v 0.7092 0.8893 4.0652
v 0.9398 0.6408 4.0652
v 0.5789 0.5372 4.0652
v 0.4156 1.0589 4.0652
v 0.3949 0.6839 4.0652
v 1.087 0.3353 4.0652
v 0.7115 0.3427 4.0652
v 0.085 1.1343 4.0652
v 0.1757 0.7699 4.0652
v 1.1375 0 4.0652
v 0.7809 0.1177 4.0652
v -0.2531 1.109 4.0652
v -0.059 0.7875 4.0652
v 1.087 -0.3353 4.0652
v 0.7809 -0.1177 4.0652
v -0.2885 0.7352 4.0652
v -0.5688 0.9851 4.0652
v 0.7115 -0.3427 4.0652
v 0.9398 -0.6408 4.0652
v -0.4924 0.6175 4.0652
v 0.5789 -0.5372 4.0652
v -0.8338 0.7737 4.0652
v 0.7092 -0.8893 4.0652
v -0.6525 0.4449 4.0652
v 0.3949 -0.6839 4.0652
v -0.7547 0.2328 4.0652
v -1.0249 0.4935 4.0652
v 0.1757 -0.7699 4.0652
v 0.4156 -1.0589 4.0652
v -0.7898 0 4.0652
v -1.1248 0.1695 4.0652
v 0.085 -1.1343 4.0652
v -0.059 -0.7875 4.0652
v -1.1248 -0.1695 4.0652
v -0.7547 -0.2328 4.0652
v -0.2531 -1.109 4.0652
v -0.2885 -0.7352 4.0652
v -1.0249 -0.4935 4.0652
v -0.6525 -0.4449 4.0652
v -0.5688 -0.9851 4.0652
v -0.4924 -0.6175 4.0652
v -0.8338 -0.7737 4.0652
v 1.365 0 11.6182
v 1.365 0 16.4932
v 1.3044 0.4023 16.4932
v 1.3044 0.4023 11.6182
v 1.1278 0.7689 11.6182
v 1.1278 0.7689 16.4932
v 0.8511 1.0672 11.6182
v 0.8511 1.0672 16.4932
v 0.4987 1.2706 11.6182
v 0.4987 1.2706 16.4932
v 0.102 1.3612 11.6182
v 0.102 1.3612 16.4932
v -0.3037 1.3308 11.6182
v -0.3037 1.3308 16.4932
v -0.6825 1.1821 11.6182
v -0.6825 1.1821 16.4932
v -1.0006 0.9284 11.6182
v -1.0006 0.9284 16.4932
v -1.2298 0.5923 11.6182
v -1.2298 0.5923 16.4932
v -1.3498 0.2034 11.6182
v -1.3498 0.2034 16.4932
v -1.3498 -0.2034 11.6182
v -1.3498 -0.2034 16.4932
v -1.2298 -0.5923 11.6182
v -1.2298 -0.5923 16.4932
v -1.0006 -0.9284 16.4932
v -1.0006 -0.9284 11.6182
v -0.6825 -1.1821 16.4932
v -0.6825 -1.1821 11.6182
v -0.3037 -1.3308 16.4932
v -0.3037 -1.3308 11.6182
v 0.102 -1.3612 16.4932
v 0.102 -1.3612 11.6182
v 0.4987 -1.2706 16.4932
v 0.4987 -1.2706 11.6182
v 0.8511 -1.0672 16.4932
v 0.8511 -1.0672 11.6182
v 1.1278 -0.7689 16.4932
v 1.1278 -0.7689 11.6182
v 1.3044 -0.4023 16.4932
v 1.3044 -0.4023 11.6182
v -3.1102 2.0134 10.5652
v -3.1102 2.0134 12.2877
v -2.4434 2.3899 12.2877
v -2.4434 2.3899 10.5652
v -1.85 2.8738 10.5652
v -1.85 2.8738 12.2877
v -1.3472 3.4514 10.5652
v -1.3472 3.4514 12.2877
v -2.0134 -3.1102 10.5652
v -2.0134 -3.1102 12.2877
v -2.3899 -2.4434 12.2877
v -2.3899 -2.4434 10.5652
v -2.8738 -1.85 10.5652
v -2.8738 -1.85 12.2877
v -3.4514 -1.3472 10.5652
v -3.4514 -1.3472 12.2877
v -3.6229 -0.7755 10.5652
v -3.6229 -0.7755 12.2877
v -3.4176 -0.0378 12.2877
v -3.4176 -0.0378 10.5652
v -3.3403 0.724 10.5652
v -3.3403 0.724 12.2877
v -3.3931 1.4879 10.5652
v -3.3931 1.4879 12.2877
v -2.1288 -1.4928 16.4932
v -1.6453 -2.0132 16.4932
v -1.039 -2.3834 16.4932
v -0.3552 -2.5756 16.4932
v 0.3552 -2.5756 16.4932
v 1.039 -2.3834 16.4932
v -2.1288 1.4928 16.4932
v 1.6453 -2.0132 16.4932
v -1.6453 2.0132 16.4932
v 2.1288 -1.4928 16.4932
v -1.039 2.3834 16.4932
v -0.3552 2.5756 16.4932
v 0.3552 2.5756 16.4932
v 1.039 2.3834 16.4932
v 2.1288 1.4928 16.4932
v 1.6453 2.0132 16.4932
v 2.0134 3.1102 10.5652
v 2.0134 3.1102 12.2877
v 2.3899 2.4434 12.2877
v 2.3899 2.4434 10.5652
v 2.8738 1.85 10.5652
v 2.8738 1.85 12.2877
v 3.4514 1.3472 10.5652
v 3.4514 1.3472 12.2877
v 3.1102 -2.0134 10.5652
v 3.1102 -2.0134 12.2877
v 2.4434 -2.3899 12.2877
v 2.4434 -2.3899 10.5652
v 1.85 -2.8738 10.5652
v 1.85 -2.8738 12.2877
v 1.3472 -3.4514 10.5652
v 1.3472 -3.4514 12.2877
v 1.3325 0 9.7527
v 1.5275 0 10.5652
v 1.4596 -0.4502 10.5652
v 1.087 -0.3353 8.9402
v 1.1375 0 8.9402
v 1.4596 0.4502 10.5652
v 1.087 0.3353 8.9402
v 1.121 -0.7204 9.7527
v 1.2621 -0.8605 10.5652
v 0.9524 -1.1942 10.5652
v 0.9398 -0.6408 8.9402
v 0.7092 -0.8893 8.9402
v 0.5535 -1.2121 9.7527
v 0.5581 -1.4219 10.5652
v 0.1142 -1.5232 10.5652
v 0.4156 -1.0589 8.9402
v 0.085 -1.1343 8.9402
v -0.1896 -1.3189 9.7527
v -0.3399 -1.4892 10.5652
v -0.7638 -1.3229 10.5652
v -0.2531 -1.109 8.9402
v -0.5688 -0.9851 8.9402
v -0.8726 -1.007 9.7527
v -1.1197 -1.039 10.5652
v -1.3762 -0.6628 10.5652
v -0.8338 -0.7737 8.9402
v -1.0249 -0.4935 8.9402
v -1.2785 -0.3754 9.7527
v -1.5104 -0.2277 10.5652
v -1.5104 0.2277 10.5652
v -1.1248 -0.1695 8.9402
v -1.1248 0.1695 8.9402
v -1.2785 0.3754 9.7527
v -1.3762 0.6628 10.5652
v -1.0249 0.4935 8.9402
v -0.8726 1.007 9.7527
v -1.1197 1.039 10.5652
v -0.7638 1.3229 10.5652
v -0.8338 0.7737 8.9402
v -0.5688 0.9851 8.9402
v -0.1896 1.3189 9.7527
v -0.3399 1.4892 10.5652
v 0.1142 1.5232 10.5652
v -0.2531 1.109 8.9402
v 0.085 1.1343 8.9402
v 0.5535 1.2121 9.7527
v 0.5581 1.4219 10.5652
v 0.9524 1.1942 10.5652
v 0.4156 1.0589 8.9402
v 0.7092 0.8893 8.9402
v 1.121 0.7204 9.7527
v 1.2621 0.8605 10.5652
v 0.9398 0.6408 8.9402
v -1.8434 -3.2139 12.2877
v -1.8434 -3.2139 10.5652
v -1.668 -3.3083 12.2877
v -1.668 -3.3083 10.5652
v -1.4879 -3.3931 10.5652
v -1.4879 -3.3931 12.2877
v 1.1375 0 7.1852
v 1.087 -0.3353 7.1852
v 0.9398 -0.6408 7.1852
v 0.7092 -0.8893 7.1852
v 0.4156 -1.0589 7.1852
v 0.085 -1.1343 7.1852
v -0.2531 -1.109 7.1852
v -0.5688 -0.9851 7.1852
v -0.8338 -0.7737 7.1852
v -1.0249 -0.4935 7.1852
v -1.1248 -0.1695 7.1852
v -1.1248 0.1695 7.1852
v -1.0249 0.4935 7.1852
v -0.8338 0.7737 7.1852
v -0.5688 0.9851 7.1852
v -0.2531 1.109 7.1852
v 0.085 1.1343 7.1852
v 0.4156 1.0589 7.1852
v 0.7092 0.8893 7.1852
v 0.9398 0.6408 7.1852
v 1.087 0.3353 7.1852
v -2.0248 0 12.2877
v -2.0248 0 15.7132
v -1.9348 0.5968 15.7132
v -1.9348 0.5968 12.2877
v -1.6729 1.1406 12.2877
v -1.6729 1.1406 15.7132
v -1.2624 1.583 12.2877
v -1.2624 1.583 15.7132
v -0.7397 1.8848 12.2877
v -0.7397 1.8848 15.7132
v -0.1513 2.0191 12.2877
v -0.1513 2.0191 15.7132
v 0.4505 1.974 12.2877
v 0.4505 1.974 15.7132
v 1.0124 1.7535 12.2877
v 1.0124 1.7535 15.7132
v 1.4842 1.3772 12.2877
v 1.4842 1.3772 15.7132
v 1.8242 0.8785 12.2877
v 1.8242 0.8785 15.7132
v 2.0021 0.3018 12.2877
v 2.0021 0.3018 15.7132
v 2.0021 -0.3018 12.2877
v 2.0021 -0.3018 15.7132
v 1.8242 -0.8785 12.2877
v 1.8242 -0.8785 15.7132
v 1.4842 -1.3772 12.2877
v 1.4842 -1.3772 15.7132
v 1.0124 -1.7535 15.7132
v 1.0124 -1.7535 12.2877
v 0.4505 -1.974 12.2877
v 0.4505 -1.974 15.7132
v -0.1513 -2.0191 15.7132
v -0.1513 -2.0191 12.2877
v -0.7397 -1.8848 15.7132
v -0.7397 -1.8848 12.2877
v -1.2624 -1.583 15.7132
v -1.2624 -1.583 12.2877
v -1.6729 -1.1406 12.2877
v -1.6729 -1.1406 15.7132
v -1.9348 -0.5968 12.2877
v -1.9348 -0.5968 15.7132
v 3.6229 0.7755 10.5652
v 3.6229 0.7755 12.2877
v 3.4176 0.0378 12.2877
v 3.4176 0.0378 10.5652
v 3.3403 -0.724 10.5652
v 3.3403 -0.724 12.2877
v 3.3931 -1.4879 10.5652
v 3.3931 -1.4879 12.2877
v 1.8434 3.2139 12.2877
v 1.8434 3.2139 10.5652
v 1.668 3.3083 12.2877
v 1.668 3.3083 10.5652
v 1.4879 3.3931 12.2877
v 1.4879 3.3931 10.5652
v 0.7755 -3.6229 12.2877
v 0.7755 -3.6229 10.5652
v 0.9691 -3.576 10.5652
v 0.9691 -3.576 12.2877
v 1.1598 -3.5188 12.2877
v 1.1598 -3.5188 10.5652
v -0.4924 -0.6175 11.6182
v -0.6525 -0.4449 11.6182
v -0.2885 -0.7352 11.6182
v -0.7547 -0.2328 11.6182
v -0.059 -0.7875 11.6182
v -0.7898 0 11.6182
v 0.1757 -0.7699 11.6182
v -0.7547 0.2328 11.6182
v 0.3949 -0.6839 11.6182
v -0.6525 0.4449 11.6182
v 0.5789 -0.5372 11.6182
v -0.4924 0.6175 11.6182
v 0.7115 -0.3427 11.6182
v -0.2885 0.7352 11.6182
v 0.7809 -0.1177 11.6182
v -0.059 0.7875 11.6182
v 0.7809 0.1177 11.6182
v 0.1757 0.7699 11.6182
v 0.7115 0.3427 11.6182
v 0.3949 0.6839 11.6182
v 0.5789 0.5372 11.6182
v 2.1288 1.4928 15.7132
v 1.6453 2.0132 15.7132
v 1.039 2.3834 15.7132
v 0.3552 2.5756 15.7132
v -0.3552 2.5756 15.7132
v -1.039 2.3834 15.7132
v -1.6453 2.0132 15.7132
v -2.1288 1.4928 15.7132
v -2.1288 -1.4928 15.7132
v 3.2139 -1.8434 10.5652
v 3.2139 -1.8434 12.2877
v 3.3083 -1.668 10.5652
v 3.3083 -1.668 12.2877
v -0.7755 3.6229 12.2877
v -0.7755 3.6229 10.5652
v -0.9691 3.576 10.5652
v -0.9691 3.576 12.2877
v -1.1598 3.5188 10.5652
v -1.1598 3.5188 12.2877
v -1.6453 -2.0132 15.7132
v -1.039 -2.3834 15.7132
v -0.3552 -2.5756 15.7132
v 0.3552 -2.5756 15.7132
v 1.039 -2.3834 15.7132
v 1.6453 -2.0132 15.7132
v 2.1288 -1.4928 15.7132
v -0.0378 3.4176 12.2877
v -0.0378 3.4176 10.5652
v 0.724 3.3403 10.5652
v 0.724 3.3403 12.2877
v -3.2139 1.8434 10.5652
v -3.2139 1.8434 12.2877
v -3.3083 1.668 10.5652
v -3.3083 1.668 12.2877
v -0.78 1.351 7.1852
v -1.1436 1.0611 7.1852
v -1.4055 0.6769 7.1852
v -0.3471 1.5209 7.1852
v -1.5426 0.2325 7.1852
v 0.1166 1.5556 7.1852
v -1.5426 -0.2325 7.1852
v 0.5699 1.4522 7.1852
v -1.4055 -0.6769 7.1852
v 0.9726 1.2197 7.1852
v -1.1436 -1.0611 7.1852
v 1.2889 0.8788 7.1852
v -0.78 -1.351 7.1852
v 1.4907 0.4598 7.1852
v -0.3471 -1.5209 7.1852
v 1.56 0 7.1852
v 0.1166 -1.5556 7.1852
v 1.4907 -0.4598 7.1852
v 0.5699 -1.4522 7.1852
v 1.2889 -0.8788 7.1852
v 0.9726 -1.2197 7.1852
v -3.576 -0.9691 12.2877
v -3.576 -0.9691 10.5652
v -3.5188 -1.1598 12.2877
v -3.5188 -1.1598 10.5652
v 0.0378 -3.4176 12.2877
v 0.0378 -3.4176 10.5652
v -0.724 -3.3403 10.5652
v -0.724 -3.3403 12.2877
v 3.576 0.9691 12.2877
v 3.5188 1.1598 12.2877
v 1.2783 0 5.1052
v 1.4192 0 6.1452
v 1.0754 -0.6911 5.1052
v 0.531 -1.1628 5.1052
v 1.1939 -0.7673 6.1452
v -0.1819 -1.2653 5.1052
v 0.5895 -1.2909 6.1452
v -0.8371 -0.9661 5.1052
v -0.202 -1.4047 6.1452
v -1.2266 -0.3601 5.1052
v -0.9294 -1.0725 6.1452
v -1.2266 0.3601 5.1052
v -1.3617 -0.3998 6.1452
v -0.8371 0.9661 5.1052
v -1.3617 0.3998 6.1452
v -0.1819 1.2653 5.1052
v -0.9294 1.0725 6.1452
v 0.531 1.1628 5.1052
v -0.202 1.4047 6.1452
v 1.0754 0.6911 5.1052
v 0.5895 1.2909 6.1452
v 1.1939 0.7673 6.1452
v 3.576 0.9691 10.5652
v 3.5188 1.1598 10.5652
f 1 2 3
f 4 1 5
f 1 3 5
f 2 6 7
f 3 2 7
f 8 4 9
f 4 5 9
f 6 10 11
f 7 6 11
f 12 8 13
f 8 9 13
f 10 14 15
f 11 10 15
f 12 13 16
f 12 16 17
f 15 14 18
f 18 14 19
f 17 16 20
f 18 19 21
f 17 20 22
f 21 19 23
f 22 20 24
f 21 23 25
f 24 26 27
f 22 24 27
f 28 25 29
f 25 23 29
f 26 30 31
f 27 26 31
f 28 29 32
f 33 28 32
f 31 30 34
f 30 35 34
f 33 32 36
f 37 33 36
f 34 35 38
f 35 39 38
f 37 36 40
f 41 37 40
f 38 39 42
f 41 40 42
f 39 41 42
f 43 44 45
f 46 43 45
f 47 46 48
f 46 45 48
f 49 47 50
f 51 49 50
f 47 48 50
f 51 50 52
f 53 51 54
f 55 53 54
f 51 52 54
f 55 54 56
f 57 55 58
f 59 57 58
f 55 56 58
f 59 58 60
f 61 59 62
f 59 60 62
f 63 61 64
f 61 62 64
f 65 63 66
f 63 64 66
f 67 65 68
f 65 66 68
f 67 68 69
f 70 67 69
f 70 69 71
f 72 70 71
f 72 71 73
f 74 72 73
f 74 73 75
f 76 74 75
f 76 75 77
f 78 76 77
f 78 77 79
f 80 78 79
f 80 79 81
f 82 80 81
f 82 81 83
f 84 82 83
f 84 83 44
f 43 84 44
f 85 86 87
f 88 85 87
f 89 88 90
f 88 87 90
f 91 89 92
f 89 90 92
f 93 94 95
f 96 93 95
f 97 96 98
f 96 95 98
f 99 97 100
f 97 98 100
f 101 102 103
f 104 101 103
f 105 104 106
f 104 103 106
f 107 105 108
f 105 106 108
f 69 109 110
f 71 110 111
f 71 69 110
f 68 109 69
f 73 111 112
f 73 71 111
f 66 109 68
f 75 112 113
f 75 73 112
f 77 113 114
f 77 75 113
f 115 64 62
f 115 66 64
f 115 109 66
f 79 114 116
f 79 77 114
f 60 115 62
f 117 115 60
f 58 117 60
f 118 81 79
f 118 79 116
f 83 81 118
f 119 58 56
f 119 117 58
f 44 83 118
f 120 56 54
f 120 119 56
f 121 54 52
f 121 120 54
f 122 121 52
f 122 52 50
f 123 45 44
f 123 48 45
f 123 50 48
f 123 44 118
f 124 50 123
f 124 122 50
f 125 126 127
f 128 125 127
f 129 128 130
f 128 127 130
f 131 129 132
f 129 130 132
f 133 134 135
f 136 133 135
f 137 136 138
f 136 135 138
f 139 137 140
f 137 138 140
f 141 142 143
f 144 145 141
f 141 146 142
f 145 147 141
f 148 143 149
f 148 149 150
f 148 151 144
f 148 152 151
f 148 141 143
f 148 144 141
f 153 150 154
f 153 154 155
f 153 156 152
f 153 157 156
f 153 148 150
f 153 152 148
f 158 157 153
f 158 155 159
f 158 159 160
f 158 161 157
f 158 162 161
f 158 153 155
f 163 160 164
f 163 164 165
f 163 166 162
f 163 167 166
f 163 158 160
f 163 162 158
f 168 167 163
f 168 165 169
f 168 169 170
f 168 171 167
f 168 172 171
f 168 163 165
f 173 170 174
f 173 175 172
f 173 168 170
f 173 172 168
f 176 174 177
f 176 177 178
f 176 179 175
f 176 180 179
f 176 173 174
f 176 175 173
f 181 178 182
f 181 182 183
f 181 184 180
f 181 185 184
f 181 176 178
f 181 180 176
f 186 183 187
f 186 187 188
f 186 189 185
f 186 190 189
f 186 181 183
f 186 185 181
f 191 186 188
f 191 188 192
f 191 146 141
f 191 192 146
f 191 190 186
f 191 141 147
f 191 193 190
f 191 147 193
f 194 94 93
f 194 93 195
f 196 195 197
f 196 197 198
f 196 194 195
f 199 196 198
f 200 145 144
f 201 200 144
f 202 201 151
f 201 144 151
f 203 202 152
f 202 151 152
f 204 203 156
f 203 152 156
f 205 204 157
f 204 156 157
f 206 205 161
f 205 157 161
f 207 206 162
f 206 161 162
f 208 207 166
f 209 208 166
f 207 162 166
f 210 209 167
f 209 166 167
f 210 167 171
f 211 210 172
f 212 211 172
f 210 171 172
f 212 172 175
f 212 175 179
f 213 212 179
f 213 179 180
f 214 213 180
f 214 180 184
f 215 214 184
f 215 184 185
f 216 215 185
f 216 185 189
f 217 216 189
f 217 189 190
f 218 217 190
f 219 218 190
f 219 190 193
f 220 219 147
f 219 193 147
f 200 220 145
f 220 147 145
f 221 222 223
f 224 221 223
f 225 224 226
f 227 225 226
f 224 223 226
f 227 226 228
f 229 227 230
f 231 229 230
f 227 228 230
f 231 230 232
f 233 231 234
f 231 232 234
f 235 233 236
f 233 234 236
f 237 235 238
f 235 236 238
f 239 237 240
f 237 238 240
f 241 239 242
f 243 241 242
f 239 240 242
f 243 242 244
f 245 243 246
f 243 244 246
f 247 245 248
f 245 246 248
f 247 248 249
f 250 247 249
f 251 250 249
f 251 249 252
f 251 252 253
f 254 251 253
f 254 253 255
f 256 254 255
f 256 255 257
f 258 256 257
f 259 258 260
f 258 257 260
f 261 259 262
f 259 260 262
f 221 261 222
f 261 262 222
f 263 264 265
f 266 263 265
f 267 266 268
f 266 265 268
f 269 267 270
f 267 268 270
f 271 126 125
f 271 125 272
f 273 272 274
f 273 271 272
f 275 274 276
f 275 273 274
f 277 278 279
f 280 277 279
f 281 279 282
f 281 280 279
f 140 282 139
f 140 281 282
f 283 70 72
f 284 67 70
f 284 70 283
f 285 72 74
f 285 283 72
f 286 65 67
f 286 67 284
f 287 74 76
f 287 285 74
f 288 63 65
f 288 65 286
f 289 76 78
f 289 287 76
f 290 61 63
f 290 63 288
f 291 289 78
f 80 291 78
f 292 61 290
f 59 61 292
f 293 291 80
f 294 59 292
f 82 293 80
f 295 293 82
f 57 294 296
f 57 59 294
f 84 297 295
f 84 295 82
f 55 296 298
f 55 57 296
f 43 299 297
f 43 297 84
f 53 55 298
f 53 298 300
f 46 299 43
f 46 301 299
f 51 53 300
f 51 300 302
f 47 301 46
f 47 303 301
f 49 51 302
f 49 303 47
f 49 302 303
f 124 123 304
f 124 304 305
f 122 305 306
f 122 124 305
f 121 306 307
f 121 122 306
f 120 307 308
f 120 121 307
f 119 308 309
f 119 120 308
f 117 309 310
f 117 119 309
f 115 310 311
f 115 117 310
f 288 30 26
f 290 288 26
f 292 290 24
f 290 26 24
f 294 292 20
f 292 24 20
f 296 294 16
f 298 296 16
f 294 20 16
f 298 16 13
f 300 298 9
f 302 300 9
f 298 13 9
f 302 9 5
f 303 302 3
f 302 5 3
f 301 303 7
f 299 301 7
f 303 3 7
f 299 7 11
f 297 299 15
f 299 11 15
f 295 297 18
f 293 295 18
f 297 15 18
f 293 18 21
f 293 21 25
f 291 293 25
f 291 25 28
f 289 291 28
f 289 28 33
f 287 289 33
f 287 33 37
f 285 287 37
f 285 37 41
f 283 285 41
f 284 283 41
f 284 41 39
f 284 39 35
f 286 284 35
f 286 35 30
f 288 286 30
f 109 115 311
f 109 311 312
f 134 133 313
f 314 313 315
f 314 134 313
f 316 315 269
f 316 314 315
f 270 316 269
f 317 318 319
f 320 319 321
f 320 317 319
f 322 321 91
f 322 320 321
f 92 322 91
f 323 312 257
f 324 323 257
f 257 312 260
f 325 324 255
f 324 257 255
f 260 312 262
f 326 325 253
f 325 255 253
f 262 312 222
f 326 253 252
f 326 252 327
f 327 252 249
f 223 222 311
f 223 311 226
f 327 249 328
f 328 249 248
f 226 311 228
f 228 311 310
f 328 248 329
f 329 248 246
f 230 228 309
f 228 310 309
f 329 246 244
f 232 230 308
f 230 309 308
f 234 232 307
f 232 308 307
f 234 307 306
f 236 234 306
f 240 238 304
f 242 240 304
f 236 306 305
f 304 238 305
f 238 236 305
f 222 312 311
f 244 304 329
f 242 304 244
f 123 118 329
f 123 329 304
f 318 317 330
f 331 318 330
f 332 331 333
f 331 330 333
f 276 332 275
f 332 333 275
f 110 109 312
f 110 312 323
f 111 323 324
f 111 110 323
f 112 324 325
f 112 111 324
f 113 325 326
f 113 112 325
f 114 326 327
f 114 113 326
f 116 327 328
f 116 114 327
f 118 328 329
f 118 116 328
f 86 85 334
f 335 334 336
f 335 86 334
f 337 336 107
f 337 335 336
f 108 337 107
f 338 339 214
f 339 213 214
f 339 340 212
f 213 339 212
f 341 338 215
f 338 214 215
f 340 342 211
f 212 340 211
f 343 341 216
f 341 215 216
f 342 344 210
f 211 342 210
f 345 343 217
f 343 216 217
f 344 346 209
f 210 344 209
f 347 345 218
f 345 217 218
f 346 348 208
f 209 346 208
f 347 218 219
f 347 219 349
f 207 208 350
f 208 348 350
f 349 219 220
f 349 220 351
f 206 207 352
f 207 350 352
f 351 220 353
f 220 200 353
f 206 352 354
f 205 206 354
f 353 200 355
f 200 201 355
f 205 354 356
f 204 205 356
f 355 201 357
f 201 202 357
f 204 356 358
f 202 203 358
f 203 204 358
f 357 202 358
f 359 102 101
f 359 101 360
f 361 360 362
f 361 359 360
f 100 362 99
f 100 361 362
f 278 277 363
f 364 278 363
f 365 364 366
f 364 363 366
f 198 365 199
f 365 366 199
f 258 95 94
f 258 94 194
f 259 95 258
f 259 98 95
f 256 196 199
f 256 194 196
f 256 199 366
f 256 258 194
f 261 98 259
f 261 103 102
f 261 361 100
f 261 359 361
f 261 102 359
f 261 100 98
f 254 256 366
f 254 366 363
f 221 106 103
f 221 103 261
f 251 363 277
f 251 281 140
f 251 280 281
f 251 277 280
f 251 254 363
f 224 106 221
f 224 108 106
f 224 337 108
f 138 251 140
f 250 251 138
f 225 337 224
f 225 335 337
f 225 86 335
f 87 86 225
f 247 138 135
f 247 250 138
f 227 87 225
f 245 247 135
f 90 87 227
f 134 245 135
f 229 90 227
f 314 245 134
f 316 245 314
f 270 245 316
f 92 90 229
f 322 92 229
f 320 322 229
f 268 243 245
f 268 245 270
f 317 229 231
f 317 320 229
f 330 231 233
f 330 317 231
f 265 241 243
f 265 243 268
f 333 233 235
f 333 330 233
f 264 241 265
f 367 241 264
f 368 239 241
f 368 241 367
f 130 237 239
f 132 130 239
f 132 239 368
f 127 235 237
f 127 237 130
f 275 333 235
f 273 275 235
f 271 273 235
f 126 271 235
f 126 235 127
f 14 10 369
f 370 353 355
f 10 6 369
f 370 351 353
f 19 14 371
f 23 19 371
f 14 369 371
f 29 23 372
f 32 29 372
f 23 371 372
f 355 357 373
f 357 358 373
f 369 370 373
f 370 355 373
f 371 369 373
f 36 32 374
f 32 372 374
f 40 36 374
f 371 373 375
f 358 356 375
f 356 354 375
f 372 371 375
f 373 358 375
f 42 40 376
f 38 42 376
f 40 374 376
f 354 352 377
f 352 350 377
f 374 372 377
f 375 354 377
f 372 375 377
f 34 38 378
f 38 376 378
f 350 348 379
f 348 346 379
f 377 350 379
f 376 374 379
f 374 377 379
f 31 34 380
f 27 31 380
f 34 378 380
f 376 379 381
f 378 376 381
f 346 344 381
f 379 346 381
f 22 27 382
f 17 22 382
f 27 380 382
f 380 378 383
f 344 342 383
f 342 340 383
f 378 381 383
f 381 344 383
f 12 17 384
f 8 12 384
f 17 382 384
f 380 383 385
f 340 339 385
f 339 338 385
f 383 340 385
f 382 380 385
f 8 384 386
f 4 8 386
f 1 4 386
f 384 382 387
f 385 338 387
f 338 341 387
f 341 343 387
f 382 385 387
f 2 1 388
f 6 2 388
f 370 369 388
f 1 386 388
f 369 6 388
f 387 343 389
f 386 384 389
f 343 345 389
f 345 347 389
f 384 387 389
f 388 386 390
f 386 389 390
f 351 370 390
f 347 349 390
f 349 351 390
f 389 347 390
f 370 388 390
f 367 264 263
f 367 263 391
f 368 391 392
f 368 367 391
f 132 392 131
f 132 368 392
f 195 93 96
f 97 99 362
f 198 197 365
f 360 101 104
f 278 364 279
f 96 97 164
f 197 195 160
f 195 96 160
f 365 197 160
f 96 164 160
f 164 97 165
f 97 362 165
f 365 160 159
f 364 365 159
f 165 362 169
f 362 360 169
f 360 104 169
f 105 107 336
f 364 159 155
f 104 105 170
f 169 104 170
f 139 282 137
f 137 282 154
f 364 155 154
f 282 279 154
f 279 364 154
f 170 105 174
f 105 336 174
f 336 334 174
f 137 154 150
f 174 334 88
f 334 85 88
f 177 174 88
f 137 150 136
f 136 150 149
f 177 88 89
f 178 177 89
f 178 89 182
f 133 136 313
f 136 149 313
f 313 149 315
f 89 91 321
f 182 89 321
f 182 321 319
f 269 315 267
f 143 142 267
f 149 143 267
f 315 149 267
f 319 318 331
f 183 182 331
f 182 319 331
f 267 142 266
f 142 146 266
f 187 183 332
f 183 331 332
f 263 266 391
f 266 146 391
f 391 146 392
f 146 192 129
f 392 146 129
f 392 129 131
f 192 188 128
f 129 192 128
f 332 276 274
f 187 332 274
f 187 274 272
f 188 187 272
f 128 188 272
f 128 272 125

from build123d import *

# Parameters (mm, degrees)
BOSS_EXTRUDE1_DEPTH                                 = 1.2
SKETCH2_R                                           = 3.115
BOSS_EXTRUDE2_DEPTH                                 = 5.27
SKETCH3_R                                           = 5.7
BOSS_EXTRUDE3_DEPTH                                 = 2.65
CUT_EXTRUDE1_DEPTH                                  = 3.65
CUT_EXTRUDE2_DEPTH                                  = 3.65
CUT_EXTRUDE3_DEPTH                                  = 3.65
CUT_EXTRUDE4_DEPTH                                  = 3.65
CUT_EXTRUDE5_DEPTH                                  = 3.65
CUT_EXTRUDE6_DEPTH                                  = 3.65
CUT_EXTRUDE7_DEPTH                                  = 3.65
CUT_EXTRUDE8_DEPTH                                  = 3.65
CBORE_FOR_2_BINDING_HEAD_MACHINE_SCREW1_D           = 2.43
CBORE_FOR_2_BINDING_HEAD_MACHINE_SCREW1_DEPTH       = 19.12
CBORE_FOR_2_BINDING_HEAD_MACHINE_SCREW1_CBORE_D     = 4.2
CBORE_FOR_2_BINDING_HEAD_MACHINE_SCREW1_CBORE_DEPTH = 7.5
CHAMFER1_SIZE                                       = 0.6
CHAMFER1_SIZE2                                      = 2.5
SCALE1_SCALE                                        = 0.65


with BuildPart() as part:
    # Sketch1 → Boss-Extrude1 (new body)
    with BuildSketch(Plane.XY.offset(19.12)):
        with BuildLine():
            Line((-3.275, 2.296600749), (-3.275, -2.296600749))
            ThreePointArc((-3.275, -2.296600749), (0, -4), (3.275, -2.296600749))
            Line((3.275, -2.296600749), (3.275, 2.296600749))
            ThreePointArc((3.275, 2.296600749), (0, 4), (-3.275, 2.296600749))
        make_face()
    extrude(amount=-BOSS_EXTRUDE1_DEPTH)

    # Sketch2 → Boss-Extrude2 (add)
    with BuildSketch(Plane(origin=(0, 0, 17.92), x_dir=(-1, 0, 0), z_dir=(0, 0, -1))):
        Circle(SKETCH2_R)
    extrude(amount=BOSS_EXTRUDE2_DEPTH)

    # Sketch3 → Boss-Extrude3 (add)
    with BuildSketch(Plane.XY.offset(12.65)):
        Circle(SKETCH3_R)
    extrude(amount=-BOSS_EXTRUDE3_DEPTH)

    # Sketch4 → Cut-Extrude1 (cut, through all)
    with BuildSketch(Plane.XY.offset(12.65)):
        with BuildLine():
            ThreePointArc((-5.220198487, 2.289001477), (-5.670846635, 0.575759012), (-5.573734722, -1.193097334))
            ThreePointArc((-5.573734722, -1.193097334), (-5.173403948, 0.525253836), (-5.220198487, 2.289001477))
        make_face()
    extrude(amount=-CUT_EXTRUDE1_DEPTH, mode=Mode.SUBTRACT)

    # Sketch5 → Cut-Extrude2 (cut, through all)
    with BuildSketch(Plane.XY.offset(12.65)):
        with BuildLine():
            ThreePointArc((-2.072669282, 5.309806215), (-3.602771009, 4.417017213), (-4.784872834, 3.097578403))
            ThreePointArc((-4.784872834, 3.097578403), (-3.286738464, 4.029559562), (-2.072669282, 5.309806215))
        make_face()
    extrude(amount=-CUT_EXTRUDE2_DEPTH, mode=Mode.SUBTRACT)

    # Sketch6 → Cut-Extrude3 (cut, through all)
    with BuildSketch(Plane.XY.offset(12.65)):
        with BuildLine():
            ThreePointArc((2.289001477, 5.220198487), (0.575759012, 5.670846635), (-1.193097334, 5.573734722))
            ThreePointArc((-1.193097334, 5.573734722), (0.525253836, 5.173403948), (2.289001477, 5.220198487))
        make_face()
    extrude(amount=-CUT_EXTRUDE3_DEPTH, mode=Mode.SUBTRACT)

    # Sketch7 → Cut-Extrude4 (cut, through all)
    with BuildSketch(Plane.XY.offset(12.65)):
        with BuildLine():
            ThreePointArc((5.309806215, 2.072669282), (4.417017213, 3.602771009), (3.097578403, 4.784872834))
            ThreePointArc((3.097578403, 4.784872834), (4.029559562, 3.286738464), (5.309806215, 2.072669282))
        make_face()
    extrude(amount=-CUT_EXTRUDE4_DEPTH, mode=Mode.SUBTRACT)

    # Sketch8 → Cut-Extrude5 (cut, through all)
    with BuildSketch(Plane.XY.offset(12.65)):
        with BuildLine():
            ThreePointArc((5.220198487, -2.289001477), (5.670846635, -0.575759012), (5.573734722, 1.193097334))
            ThreePointArc((5.573734722, 1.193097334), (5.173403948, -0.525253836), (5.220198487, -2.289001477))
        make_face()
    extrude(amount=-CUT_EXTRUDE5_DEPTH, mode=Mode.SUBTRACT)

    # Sketch9 → Cut-Extrude6 (cut, through all)
    with BuildSketch(Plane.XY.offset(12.65)):
        with BuildLine():
            ThreePointArc((2.072669282, -5.309806215), (3.602771009, -4.417017213), (4.784872834, -3.097578403))
            ThreePointArc((4.784872834, -3.097578403), (3.286738464, -4.029559562), (2.072669282, -5.309806215))
        make_face()
    extrude(amount=-CUT_EXTRUDE6_DEPTH, mode=Mode.SUBTRACT)

    # Sketch10 → Cut-Extrude7 (cut, through all)
    with BuildSketch(Plane.XY.offset(12.65)):
        with BuildLine():
            ThreePointArc((-2.289001477, -5.220198487), (-0.575759012, -5.670846635), (1.193097334, -5.573734722))
            ThreePointArc((1.193097334, -5.573734722), (-0.525253836, -5.173403948), (-2.289001477, -5.220198487))
        make_face()
    extrude(amount=-CUT_EXTRUDE7_DEPTH, mode=Mode.SUBTRACT)

    # Sketch11 → Cut-Extrude8 (cut, through all)
    with BuildSketch(Plane.XY.offset(12.65)):
        with BuildLine():
            ThreePointArc((-5.309806215, -2.072669282), (-4.417017213, -3.602771009), (-3.097578403, -4.784872834))
            ThreePointArc((-3.097578403, -4.784872834), (-4.029559562, -3.286738464), (-5.309806215, -2.072669282))
        make_face()
    extrude(amount=-CUT_EXTRUDE8_DEPTH, mode=Mode.SUBTRACT)

    # Sketch12 → Revolve1 (revolve)
    with BuildSketch(Plane.XZ):
        Polygon((1.75, 10), (0, 10), (0, 0), (1.75, 0), (2.4, 4.8), (1.75, 4.8), align=None)
    revolve(axis=Axis((0, 0, 10), (0, 0, -1)))

    # CBORE for #2 Binding Head Machine Screw1
    with Locations(Plane.XY.offset(19.12)):
        with Locations((0, 0)):
            CounterBoreHole(CBORE_FOR_2_BINDING_HEAD_MACHINE_SCREW1_D / 2, CBORE_FOR_2_BINDING_HEAD_MACHINE_SCREW1_CBORE_D / 2, CBORE_FOR_2_BINDING_HEAD_MACHINE_SCREW1_CBORE_DEPTH, depth=CBORE_FOR_2_BINDING_HEAD_MACHINE_SCREW1_DEPTH)

    # Chamfer1
    chamfer1_edges = [part.edges().sort_by_distance(p)[0] for p in [
        (-1.75, 0, 10),
    ]]
    chamfer1_side = [part.faces().sort_by_distance(p)[0] for p in [
        (-5.016561239, 0.509329652, 10),
    ]]
    chamfer(chamfer1_edges, length=CHAMFER1_SIZE, length2=CHAMFER1_SIZE2, reference=chamfer1_side[0])


with BuildPart() as part_1:
    # Scale1: scaled about (0, 0, 11.614719244)
    add(part.part.scale(SCALE1_SCALE).moved(Location((0, 0, 4.065151735))))


solid = part_1.part
